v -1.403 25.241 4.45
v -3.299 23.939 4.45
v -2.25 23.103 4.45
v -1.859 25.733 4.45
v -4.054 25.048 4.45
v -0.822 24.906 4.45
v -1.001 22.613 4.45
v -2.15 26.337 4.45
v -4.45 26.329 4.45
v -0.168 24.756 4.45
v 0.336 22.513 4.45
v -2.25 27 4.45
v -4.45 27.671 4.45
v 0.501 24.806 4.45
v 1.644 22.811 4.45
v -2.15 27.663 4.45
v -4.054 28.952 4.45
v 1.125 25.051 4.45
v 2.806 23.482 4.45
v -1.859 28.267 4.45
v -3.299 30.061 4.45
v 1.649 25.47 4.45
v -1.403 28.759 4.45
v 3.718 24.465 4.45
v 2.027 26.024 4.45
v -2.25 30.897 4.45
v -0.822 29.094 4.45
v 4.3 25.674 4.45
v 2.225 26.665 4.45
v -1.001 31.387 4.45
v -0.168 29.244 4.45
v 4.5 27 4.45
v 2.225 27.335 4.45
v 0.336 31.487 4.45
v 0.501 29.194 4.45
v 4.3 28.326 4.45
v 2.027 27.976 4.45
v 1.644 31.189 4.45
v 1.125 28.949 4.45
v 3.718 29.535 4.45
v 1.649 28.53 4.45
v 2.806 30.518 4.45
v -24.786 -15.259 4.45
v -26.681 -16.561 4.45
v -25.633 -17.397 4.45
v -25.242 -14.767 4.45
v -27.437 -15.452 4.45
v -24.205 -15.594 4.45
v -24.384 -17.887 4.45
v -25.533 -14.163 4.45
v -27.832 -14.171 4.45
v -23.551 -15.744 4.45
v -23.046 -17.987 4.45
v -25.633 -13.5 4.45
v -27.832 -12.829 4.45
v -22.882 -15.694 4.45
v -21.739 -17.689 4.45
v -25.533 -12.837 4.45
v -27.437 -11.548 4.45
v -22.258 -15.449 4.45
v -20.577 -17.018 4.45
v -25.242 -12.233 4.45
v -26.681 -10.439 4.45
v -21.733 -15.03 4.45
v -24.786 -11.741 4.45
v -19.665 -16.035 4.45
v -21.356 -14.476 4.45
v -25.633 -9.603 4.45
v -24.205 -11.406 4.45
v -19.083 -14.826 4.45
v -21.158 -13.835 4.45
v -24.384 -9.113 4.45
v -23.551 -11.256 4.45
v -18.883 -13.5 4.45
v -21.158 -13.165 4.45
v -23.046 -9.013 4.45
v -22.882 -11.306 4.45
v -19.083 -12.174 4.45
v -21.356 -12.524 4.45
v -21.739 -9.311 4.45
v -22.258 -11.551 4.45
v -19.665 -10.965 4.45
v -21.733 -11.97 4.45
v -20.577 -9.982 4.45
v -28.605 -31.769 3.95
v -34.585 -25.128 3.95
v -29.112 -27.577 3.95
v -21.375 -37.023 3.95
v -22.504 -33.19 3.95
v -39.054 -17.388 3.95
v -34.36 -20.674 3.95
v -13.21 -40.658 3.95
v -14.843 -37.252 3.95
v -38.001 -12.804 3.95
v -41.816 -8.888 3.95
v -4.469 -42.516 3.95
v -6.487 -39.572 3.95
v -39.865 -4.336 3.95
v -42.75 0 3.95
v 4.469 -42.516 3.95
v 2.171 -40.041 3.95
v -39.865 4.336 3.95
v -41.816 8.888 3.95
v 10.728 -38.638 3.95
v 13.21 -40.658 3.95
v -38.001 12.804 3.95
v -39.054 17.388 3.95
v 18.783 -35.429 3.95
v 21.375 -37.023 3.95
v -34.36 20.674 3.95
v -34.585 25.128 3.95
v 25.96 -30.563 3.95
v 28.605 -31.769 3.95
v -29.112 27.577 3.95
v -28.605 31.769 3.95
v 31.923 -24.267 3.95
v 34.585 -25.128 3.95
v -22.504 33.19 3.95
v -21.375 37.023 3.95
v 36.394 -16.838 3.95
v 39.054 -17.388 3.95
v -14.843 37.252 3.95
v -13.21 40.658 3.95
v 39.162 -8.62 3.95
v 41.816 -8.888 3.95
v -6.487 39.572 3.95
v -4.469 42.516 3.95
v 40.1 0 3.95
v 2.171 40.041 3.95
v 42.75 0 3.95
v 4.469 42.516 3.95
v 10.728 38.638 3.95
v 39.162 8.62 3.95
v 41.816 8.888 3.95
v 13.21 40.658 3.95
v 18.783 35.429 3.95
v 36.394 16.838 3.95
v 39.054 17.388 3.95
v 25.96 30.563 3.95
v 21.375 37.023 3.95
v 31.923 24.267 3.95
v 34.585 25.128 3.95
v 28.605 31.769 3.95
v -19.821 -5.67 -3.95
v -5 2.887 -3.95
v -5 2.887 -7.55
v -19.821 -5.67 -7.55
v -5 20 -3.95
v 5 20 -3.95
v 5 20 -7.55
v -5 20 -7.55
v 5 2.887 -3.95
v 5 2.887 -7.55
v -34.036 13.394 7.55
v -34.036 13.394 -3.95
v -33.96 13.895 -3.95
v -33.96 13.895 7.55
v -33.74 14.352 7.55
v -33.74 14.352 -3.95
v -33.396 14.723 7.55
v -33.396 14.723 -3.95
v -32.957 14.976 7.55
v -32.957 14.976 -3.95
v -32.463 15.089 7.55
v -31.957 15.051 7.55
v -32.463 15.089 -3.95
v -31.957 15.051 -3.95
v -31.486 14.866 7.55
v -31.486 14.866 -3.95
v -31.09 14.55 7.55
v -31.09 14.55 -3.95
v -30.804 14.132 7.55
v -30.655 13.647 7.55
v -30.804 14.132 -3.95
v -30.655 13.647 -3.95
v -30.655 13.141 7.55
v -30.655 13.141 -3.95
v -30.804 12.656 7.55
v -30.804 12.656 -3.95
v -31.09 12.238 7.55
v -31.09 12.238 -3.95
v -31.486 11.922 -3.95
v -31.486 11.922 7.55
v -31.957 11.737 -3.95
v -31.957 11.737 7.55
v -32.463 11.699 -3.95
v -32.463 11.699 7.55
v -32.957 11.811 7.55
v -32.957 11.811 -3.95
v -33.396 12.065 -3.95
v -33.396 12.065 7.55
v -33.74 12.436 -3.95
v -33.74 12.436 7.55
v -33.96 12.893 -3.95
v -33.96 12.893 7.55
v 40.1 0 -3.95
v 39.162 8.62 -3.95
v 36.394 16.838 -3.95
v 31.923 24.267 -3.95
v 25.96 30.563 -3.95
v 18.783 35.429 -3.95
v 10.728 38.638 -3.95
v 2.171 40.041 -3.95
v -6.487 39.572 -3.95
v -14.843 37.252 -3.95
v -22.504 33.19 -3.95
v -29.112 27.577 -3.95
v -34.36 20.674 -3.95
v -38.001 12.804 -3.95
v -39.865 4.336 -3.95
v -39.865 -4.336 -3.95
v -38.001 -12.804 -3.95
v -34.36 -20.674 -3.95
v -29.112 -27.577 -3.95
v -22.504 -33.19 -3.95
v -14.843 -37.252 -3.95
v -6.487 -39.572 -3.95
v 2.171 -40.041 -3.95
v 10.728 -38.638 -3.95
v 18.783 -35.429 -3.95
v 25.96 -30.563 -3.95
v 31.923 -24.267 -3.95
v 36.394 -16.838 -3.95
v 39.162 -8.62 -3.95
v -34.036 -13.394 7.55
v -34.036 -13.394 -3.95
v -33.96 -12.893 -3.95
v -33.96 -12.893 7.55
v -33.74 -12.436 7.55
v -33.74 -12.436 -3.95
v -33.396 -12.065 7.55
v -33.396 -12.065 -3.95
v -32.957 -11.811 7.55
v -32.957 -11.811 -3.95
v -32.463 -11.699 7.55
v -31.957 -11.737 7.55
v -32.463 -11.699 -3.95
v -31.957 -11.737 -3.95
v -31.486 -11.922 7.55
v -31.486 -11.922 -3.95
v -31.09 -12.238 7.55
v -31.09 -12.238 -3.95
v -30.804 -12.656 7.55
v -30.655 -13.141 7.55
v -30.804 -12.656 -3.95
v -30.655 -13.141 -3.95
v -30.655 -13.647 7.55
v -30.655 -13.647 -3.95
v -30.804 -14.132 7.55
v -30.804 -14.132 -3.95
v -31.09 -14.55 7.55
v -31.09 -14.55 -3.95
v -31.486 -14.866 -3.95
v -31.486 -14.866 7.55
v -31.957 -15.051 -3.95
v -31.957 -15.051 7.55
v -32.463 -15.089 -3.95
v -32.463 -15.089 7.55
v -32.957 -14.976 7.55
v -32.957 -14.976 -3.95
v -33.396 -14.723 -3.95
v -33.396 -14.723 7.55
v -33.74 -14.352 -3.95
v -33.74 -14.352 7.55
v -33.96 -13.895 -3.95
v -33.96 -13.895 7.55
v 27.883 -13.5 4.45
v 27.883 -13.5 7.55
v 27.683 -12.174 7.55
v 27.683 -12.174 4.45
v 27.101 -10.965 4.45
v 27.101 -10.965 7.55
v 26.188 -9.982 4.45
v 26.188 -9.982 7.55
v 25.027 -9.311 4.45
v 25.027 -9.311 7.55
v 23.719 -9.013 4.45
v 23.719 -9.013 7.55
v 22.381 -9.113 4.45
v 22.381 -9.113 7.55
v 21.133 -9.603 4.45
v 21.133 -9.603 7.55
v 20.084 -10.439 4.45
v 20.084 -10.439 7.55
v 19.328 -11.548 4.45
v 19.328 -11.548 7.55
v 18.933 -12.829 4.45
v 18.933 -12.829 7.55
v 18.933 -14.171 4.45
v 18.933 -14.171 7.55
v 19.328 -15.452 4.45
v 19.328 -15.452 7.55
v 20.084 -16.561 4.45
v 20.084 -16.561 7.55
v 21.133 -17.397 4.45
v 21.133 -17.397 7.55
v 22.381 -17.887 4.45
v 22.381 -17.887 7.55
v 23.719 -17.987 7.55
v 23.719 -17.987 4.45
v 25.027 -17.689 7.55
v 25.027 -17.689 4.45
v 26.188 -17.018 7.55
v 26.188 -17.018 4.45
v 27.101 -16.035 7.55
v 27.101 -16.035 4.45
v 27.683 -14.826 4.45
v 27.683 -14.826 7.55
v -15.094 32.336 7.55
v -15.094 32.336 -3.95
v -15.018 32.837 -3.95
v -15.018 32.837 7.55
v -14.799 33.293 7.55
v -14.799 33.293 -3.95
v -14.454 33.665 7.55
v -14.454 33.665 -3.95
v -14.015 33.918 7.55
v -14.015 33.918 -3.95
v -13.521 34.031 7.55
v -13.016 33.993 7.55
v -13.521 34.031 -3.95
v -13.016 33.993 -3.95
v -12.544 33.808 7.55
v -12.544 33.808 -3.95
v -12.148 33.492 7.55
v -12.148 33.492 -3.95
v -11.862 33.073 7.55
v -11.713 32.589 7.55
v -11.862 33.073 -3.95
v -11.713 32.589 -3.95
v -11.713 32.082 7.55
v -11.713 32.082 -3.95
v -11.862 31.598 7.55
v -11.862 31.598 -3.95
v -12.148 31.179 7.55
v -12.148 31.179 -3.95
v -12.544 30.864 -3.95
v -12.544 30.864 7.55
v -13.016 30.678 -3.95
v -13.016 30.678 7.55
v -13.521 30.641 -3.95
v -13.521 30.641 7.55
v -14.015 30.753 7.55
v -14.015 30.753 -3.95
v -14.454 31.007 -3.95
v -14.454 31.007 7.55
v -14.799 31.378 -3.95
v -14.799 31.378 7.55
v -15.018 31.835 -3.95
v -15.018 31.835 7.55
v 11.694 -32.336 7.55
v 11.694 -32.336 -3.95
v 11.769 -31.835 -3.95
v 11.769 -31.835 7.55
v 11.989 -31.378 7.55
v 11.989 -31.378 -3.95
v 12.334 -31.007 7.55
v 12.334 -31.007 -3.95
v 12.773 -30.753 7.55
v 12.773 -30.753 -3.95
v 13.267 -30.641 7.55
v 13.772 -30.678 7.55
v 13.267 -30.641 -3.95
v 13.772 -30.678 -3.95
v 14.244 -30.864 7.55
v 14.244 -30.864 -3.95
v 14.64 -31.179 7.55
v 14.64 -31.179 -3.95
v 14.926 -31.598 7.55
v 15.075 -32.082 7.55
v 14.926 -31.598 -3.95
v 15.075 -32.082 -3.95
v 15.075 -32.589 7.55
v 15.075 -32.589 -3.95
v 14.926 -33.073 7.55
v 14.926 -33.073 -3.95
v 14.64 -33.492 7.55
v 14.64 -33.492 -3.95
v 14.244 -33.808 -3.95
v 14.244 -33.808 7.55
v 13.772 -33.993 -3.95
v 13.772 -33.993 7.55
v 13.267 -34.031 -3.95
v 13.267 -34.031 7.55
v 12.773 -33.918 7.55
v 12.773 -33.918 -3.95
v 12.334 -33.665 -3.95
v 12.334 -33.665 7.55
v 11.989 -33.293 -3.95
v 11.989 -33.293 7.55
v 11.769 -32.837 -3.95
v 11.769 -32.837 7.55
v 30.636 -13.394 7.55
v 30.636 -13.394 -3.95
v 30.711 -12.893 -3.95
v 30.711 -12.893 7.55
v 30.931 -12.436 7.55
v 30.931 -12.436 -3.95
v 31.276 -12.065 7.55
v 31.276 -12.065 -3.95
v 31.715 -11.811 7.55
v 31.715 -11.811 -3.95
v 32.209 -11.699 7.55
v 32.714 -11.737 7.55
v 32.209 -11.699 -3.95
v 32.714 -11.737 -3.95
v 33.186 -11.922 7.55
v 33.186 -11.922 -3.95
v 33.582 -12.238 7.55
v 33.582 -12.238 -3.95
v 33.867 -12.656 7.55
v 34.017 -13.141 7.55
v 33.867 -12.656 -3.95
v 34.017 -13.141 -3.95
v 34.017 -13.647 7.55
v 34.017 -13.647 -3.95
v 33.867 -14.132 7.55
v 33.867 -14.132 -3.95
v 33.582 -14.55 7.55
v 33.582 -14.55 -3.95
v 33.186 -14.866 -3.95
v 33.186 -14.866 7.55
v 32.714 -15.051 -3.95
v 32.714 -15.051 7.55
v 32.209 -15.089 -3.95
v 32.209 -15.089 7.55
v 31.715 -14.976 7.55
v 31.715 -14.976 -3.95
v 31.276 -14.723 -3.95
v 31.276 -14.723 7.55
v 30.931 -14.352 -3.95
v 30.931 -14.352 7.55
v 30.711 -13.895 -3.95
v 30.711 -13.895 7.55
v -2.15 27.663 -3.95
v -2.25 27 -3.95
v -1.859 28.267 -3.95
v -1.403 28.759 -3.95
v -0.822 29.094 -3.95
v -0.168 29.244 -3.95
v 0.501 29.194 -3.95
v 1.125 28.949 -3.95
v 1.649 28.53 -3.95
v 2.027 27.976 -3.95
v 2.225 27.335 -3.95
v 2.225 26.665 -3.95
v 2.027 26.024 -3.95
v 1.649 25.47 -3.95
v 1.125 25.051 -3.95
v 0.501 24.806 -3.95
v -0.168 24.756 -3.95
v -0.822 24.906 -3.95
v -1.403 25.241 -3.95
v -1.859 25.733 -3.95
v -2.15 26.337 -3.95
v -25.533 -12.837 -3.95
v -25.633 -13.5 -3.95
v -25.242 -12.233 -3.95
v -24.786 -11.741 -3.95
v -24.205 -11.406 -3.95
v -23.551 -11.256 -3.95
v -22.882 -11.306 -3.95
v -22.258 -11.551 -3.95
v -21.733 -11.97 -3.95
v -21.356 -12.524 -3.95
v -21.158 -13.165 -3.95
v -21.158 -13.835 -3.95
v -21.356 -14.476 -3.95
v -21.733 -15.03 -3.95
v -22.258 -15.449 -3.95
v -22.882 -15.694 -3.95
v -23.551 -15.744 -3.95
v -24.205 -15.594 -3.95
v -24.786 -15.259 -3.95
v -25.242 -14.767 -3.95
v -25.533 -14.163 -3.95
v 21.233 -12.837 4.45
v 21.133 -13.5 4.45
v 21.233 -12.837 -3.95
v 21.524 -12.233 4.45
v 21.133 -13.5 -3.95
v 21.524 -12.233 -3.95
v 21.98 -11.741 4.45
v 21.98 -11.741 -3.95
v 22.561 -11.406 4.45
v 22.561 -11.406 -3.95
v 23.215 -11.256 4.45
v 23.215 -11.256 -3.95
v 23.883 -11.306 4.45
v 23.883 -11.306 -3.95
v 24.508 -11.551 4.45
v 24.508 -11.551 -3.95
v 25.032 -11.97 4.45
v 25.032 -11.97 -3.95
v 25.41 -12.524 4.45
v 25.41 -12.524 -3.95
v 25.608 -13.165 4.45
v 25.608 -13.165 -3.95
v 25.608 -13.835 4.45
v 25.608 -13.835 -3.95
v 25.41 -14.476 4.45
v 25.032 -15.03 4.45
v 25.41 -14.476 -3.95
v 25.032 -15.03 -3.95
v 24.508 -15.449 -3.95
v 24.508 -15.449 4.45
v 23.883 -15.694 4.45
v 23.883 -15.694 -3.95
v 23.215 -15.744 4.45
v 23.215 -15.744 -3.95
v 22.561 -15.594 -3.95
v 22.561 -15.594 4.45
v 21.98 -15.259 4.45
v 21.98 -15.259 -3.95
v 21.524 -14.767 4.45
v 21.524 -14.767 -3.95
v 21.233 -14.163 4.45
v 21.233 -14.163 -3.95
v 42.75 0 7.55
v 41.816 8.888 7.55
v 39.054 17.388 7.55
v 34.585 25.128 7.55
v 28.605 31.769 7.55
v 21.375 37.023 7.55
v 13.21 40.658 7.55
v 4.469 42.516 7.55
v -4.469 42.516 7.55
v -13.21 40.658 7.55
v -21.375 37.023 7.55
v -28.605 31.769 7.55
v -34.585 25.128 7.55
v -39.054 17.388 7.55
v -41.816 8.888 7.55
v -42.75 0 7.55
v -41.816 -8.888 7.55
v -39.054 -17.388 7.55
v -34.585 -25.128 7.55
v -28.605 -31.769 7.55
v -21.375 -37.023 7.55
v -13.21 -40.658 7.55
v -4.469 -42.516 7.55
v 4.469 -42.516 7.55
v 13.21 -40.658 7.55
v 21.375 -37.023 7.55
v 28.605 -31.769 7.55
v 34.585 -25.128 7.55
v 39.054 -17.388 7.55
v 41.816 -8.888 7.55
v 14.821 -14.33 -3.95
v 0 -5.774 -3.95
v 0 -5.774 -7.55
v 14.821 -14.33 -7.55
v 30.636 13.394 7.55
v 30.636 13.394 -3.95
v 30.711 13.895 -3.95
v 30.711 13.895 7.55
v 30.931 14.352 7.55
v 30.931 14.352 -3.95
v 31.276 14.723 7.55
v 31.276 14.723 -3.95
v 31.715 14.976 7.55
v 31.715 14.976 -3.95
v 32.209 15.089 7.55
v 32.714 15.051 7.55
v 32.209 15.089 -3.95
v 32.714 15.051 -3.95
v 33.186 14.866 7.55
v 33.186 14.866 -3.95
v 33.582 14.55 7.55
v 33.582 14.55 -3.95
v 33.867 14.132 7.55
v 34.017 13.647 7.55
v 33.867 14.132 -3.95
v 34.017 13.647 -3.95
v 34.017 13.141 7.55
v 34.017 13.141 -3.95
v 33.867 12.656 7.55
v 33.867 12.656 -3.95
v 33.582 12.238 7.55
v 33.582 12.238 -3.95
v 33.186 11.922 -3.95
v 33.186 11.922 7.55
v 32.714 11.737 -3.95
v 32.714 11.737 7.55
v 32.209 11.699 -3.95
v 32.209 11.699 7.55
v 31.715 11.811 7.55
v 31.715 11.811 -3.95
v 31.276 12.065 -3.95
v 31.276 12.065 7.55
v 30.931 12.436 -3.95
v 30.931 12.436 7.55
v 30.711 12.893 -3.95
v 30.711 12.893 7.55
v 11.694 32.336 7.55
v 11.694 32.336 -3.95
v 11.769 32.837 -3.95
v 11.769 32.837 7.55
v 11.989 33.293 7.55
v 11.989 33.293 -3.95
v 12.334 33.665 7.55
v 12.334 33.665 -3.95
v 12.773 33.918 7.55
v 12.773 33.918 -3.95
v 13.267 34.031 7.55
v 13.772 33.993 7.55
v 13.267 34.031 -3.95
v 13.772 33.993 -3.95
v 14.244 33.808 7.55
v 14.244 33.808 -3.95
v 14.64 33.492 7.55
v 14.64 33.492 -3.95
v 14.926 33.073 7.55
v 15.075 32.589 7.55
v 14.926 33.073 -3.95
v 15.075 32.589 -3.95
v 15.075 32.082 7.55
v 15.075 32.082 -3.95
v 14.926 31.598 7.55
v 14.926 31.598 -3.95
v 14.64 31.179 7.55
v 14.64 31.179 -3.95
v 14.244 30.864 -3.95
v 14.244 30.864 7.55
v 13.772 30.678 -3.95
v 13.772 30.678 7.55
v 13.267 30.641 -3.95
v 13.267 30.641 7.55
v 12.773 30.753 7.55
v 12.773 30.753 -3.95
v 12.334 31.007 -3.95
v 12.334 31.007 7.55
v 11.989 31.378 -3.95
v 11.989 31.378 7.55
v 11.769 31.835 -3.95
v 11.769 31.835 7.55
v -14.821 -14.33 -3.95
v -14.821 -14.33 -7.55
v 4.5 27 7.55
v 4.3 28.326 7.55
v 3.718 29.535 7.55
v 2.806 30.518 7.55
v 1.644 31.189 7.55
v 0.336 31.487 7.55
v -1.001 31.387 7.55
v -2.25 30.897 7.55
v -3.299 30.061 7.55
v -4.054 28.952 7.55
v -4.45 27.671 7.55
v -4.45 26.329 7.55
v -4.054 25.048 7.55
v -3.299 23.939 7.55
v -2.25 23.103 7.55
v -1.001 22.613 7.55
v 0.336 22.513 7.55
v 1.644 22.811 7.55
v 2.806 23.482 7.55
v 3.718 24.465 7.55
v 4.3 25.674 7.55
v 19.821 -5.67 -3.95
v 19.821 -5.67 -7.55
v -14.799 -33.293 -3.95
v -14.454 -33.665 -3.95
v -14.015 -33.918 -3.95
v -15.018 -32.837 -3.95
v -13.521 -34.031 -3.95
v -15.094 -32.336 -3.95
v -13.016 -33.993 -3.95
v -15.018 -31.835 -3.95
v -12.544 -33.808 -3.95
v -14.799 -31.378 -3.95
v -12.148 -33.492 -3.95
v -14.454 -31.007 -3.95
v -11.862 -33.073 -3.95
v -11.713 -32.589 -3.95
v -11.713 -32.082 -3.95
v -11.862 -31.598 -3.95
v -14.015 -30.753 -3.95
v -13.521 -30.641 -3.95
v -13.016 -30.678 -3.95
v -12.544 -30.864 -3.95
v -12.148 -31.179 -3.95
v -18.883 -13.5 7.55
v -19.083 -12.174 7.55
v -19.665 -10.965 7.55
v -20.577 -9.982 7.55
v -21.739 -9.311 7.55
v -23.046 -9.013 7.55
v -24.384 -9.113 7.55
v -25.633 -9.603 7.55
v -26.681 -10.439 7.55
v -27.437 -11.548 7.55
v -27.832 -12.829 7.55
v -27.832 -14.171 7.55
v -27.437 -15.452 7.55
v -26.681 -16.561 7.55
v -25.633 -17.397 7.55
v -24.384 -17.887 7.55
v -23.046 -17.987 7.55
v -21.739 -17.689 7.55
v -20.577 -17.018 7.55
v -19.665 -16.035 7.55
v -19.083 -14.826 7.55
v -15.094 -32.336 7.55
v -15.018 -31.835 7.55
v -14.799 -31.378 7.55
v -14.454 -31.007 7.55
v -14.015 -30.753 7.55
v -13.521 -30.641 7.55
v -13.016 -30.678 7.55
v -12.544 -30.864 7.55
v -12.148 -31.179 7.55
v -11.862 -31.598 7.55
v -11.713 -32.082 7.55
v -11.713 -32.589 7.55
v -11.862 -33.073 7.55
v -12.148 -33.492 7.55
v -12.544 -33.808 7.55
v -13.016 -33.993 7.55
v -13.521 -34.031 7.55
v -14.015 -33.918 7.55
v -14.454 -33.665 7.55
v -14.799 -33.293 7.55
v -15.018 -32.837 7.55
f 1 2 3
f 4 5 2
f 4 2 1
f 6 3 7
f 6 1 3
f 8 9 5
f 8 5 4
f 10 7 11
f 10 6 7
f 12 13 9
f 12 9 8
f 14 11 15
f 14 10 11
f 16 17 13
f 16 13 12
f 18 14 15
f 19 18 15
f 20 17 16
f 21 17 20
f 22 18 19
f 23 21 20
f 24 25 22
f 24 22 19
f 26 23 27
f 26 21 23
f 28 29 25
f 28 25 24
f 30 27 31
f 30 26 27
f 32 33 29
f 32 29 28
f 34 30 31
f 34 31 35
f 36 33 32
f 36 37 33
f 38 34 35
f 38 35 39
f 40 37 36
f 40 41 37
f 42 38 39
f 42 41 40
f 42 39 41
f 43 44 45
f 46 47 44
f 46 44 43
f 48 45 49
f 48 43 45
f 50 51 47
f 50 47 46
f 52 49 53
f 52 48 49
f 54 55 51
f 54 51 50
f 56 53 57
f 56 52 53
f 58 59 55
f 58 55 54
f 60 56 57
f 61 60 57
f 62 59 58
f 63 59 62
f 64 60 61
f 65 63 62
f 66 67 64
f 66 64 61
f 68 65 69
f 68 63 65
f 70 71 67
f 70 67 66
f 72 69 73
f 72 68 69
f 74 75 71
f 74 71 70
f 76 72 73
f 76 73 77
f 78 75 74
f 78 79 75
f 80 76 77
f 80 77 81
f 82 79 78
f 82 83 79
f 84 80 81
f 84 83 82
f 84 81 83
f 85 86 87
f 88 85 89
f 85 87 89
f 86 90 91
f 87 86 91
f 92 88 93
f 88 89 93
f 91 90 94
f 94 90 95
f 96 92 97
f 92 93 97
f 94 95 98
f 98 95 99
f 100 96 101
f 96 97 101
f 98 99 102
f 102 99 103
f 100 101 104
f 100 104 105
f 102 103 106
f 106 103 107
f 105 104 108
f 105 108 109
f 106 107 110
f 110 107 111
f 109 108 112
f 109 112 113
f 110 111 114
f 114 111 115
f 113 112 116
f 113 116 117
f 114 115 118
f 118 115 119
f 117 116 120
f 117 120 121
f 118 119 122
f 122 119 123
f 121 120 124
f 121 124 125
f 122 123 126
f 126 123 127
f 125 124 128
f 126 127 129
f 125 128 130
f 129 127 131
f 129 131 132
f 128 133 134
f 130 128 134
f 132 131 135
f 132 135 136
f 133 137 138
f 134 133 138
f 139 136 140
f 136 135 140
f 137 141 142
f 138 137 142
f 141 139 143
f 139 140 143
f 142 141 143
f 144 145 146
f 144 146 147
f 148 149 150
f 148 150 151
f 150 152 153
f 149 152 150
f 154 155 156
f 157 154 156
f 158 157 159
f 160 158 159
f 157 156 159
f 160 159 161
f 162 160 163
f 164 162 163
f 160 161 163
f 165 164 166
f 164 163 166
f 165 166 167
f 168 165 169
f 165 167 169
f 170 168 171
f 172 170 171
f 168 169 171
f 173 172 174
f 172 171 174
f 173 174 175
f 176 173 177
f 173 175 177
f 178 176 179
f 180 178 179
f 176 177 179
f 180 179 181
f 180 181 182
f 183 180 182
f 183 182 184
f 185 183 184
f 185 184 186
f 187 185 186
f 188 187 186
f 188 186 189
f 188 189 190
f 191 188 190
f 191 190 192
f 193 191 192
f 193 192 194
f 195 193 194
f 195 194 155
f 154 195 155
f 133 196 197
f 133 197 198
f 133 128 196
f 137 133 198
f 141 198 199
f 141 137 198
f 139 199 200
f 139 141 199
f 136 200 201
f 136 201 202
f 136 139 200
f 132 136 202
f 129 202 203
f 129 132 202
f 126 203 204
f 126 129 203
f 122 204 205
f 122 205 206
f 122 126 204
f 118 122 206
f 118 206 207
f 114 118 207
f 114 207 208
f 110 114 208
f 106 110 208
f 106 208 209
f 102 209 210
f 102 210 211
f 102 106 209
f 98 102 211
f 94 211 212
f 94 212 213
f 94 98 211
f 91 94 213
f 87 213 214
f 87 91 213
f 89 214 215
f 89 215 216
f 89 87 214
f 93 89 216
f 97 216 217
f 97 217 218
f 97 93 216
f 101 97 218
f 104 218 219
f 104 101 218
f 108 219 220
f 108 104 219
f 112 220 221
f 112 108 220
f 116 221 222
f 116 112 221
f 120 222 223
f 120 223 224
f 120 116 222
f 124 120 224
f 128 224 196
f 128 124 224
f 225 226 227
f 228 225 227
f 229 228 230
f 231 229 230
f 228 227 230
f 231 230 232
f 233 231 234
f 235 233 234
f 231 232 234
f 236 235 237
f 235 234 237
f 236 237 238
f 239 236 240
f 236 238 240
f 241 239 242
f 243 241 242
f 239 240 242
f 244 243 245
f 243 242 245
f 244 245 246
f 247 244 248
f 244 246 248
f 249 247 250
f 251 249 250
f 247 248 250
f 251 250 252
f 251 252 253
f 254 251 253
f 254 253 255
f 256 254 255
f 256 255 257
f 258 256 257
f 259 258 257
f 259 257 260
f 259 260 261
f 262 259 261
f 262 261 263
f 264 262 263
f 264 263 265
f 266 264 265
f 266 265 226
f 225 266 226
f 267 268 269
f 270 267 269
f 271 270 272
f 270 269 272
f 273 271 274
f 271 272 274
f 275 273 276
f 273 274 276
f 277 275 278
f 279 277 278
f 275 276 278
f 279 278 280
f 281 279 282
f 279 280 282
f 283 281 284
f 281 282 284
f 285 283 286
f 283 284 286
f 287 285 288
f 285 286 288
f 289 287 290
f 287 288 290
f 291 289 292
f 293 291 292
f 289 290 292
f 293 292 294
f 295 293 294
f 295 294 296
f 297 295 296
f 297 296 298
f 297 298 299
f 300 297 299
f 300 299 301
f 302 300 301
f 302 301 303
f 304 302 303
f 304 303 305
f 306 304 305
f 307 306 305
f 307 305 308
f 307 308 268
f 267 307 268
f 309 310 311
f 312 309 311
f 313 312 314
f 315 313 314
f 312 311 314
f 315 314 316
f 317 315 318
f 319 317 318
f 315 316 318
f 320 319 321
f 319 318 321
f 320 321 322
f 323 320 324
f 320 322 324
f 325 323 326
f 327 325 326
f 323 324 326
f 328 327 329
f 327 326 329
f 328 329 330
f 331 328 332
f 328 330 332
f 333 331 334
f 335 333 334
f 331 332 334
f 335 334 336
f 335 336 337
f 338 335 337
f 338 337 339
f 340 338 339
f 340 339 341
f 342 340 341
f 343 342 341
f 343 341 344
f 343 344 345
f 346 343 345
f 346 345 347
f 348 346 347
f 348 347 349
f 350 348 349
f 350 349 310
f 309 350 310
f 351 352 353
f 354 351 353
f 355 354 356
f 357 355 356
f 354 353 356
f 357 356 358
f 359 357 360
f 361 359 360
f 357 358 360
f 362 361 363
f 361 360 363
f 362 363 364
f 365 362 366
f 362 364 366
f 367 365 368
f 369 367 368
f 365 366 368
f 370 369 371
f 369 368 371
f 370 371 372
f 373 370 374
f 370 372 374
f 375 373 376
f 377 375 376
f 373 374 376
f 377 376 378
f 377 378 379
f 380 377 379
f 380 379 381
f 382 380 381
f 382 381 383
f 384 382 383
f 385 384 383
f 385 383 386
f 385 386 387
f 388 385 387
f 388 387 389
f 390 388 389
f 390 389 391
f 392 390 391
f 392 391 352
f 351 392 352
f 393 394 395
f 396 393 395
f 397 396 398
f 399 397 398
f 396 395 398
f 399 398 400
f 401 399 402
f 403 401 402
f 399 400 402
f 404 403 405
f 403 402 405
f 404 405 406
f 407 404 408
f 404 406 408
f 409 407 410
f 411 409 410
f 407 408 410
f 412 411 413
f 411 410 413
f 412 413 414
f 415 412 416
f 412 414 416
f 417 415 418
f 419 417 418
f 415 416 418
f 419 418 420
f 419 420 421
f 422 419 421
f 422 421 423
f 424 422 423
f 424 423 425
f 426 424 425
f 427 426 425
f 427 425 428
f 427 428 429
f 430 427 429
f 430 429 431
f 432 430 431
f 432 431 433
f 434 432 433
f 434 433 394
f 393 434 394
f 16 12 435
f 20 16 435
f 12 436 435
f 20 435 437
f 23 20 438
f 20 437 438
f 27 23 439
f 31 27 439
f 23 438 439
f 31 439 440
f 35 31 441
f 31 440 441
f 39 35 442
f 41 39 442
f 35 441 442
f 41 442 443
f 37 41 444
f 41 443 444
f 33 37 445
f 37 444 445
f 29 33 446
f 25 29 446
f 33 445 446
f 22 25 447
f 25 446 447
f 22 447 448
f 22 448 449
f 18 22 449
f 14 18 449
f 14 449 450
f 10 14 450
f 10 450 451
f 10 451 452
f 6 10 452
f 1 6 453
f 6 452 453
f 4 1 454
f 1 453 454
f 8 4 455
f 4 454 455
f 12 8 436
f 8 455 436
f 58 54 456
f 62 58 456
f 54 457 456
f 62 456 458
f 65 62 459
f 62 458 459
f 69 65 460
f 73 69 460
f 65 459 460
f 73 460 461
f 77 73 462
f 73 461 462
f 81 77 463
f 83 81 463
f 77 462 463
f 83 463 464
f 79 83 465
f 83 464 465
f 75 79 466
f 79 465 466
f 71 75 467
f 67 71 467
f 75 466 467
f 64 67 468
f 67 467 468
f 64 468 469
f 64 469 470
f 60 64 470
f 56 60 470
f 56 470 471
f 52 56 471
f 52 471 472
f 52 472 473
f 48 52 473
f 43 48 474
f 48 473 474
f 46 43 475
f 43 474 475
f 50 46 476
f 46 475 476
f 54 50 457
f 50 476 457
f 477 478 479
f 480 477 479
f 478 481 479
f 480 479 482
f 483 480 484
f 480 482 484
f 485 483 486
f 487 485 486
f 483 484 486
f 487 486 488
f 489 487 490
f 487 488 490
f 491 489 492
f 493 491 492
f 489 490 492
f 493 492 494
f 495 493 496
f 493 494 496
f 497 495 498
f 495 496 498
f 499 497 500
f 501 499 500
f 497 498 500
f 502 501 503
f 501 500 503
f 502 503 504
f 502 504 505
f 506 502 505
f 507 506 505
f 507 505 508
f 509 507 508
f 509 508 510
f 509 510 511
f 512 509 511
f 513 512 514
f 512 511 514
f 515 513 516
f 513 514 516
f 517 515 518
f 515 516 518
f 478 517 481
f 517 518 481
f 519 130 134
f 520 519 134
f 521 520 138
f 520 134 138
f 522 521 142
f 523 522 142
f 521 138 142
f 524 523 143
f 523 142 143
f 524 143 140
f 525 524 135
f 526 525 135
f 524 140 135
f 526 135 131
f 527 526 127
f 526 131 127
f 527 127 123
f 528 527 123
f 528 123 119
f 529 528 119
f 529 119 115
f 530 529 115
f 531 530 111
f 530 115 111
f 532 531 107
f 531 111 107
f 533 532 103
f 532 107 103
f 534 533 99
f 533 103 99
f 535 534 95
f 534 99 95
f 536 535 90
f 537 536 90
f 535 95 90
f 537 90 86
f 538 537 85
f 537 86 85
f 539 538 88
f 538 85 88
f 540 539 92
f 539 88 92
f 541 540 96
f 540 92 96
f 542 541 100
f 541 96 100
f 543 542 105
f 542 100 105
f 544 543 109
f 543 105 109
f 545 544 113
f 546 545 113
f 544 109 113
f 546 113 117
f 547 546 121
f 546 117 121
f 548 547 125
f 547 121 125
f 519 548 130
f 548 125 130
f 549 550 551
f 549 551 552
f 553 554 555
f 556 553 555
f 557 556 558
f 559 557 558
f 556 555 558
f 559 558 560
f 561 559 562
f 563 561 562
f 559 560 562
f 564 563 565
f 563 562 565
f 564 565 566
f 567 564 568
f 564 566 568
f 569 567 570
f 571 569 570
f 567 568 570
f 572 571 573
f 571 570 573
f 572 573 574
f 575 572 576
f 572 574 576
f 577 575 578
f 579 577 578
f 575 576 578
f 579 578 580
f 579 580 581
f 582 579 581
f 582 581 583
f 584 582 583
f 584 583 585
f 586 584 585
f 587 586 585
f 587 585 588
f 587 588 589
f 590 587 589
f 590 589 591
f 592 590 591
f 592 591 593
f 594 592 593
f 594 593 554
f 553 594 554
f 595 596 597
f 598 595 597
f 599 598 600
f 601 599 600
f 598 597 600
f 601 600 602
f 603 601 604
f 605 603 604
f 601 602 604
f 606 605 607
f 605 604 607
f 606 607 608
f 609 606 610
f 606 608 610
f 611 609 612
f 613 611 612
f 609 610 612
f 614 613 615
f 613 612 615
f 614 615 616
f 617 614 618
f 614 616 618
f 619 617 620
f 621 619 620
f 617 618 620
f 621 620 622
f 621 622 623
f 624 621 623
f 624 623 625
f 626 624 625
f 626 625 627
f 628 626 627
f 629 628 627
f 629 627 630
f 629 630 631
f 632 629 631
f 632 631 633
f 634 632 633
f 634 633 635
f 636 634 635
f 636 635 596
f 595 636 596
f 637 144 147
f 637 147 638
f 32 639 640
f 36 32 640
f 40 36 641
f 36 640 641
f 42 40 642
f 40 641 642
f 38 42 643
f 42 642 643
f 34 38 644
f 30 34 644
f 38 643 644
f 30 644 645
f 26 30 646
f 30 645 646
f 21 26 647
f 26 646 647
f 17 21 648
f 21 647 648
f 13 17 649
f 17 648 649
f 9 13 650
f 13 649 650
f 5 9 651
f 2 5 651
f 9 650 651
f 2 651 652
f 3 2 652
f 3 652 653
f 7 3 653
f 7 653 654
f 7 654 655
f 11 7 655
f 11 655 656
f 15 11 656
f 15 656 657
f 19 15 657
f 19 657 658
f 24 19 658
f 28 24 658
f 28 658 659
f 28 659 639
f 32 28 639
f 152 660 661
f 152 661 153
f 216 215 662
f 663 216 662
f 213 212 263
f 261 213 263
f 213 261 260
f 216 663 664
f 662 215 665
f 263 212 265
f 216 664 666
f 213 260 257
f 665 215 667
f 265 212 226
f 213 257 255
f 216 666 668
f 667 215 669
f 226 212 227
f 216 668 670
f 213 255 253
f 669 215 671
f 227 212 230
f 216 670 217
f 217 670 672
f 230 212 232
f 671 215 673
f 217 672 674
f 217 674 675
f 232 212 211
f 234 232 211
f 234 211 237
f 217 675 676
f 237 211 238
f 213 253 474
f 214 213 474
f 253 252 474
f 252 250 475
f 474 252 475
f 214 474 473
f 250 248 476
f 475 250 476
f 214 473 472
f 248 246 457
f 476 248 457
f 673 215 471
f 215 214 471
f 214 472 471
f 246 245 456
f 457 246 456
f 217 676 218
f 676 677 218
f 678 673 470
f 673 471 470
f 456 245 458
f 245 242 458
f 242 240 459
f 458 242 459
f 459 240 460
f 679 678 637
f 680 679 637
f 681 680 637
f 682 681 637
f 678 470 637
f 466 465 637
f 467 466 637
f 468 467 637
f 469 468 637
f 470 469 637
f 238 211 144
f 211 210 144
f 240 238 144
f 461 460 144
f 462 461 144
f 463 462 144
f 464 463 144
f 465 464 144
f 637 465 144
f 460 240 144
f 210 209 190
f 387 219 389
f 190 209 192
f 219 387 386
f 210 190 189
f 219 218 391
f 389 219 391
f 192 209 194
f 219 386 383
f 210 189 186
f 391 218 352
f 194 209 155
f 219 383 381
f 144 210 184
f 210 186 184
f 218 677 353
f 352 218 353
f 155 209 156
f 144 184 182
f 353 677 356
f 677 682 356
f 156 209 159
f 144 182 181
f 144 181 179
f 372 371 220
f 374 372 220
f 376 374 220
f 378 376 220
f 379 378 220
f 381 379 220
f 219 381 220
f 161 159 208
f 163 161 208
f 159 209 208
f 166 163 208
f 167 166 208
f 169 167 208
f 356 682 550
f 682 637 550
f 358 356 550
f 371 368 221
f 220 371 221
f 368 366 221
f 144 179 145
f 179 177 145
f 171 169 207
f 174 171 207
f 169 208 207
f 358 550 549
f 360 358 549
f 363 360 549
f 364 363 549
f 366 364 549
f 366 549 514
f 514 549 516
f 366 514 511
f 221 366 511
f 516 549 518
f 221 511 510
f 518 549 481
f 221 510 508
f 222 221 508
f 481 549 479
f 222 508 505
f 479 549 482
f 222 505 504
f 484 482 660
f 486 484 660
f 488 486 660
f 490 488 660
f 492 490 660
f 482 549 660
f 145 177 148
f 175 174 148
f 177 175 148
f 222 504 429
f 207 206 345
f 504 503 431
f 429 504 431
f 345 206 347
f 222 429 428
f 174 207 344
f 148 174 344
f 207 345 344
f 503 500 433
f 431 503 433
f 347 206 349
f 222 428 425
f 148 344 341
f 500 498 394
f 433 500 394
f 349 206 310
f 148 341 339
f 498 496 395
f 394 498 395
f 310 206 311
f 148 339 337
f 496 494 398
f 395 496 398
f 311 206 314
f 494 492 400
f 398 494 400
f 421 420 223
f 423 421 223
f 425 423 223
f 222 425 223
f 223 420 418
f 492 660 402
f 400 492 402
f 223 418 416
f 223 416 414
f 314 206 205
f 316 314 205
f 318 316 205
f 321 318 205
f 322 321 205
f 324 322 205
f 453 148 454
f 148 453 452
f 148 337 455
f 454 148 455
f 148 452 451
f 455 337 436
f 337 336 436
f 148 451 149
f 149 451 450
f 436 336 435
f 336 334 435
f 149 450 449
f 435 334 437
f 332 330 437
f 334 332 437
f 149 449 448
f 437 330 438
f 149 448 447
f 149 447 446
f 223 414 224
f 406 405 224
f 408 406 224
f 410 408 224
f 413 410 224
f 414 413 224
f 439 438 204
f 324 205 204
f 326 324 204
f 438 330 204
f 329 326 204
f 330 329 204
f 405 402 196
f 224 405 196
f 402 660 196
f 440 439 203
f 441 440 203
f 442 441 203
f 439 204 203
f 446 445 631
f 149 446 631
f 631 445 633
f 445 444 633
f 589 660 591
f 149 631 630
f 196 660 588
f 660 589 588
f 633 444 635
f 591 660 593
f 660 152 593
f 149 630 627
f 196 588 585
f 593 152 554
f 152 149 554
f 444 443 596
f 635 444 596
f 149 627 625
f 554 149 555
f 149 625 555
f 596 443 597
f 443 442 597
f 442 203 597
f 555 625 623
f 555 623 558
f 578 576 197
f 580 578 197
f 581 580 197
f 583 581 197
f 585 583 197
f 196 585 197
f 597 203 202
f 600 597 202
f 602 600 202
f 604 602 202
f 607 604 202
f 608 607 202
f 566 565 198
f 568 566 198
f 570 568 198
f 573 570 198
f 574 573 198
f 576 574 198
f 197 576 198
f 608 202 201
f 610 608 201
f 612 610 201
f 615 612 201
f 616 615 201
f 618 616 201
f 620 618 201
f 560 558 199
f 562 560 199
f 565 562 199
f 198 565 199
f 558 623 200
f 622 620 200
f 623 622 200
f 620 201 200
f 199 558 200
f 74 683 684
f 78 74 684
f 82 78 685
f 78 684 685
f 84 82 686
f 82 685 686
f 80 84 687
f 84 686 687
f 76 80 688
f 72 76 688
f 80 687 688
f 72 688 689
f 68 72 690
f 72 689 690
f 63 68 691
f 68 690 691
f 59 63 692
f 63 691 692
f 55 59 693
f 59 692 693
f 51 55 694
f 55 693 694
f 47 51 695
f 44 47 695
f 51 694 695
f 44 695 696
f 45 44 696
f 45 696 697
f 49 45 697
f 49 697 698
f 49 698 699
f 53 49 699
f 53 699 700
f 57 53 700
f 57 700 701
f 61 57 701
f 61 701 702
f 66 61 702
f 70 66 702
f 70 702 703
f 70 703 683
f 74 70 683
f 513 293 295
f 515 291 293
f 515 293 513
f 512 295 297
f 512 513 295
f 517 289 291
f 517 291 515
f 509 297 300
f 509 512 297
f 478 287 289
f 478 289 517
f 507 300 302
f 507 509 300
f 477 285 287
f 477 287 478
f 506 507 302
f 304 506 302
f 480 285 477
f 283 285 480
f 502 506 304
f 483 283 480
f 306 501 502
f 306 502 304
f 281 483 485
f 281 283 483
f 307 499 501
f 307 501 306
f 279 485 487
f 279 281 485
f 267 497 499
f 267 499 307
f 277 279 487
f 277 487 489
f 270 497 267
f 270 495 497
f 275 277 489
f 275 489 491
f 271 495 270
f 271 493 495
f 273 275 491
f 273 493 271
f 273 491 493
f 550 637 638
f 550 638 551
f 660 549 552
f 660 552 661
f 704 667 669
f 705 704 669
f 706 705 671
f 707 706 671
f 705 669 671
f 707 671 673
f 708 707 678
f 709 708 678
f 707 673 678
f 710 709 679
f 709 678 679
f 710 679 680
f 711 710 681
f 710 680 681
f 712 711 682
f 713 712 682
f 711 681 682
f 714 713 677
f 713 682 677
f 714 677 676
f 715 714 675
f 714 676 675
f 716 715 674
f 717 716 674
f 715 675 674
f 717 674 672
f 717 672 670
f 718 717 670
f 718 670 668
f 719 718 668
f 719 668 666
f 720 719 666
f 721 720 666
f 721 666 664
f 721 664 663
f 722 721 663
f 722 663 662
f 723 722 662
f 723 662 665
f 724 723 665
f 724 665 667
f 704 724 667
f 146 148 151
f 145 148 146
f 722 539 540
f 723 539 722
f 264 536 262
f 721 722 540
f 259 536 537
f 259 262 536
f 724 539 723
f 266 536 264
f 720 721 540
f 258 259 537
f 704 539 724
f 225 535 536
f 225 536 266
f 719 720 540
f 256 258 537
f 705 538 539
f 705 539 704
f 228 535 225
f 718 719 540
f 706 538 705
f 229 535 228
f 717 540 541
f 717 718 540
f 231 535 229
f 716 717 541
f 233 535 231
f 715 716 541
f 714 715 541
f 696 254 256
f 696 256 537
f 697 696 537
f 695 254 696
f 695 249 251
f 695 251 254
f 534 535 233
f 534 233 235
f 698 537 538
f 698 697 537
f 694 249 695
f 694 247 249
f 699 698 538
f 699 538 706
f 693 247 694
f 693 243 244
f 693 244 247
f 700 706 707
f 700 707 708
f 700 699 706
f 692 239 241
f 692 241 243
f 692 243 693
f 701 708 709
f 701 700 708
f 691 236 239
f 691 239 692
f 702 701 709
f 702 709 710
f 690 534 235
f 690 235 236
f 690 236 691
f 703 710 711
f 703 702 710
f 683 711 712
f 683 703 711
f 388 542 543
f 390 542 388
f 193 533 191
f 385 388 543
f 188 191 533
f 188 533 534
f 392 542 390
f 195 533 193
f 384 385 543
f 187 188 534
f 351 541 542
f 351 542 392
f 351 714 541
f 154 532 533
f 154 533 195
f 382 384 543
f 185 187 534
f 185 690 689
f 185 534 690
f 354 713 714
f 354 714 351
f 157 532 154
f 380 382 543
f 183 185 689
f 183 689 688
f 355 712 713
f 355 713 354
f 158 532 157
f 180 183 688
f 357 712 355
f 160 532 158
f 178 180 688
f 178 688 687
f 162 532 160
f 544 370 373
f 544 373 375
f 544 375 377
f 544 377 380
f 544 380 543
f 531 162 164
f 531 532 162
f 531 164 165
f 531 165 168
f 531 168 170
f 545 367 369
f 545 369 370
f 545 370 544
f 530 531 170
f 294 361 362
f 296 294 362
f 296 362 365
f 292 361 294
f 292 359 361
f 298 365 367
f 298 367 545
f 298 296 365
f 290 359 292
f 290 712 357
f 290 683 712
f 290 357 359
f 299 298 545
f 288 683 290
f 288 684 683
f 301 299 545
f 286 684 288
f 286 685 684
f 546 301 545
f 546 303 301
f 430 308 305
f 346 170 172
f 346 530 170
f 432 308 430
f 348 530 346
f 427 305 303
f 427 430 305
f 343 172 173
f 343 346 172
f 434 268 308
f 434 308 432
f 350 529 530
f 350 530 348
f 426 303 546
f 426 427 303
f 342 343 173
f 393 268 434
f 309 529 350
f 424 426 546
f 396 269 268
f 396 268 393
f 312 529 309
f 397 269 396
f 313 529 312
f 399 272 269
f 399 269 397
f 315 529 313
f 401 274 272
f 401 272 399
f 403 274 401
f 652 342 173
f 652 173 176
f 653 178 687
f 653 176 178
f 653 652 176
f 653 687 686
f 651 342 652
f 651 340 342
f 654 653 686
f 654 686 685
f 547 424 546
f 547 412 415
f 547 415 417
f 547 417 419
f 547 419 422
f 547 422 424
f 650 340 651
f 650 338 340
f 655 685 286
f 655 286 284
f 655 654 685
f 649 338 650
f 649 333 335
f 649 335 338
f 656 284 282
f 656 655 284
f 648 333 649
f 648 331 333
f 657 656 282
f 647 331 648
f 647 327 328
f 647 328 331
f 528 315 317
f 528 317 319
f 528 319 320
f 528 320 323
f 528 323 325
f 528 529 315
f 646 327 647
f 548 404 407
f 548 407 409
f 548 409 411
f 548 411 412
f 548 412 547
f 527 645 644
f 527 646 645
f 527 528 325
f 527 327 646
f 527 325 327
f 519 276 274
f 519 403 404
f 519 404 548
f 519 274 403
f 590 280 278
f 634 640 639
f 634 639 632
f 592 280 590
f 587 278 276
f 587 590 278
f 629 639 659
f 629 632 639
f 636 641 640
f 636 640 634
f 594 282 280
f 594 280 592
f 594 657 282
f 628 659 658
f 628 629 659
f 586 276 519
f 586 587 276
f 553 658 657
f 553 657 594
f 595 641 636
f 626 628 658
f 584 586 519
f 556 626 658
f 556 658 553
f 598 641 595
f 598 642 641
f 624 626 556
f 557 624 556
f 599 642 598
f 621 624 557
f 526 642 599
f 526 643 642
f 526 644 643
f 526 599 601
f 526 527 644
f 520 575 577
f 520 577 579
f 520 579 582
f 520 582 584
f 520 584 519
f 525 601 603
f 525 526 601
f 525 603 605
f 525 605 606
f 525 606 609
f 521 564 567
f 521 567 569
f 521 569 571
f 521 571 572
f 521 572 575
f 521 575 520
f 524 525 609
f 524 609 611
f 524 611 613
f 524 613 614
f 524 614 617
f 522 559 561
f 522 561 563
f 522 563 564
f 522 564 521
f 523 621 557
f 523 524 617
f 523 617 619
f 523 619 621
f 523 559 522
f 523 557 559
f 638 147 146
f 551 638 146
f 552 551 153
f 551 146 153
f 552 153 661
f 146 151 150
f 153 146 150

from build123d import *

# Parameters (mm, degrees)
CROQUIS1_R                                           = 40.1
SALIENTE_EXTRUIR1_DEPTH                              = 3.95
CROQUIS2_R                                           = 42.75
SALIENTE_EXTRUIR2_DEPTH                              = 3.6
REFRENTADO_PARA_TORNILLO_CON_CABEZA_TRON_D           = 4.5
REFRENTADO_PARA_TORNILLO_CON_CABEZA_TRON_CBORE_D     = 9
REFRENTADO_PARA_TORNILLO_CON_CABEZA_TRON_CBORE_DEPTH = 3.1
SALIENTE_EXTRUIR3_DEPTH                              = 3.6
TALADRO_DE_MARGEN_PARA_M32_D                         = 3.4


with BuildPart() as part:
    # Croquis1 → Saliente-Extruir1 (new, symmetric)
    with BuildSketch(Plane.XY):
        Circle(CROQUIS1_R)
    extrude(amount=SALIENTE_EXTRUIR1_DEPTH, both=True)

    # Croquis2 → Saliente-Extruir2 (add)
    with BuildSketch(Plane.XY.offset(3.95)):
        Circle(CROQUIS2_R)
    extrude(amount=SALIENTE_EXTRUIR2_DEPTH)

    # Refrentado para tornillo con cabeza troncocónica de M41 (through all)
    with Locations(Plane.XY.offset(7.55)):
        with Locations((0, 27), (23.382685902, -13.5), (-23.382685902, -13.5)):
            CounterBoreHole(REFRENTADO_PARA_TORNILLO_CON_CABEZA_TRON_D / 2, REFRENTADO_PARA_TORNILLO_CON_CABEZA_TRON_CBORE_D / 2, REFRENTADO_PARA_TORNILLO_CON_CABEZA_TRON_CBORE_DEPTH)

    # Croquis6 → Saliente-Extruir3 (add)
    with BuildSketch(Plane(origin=(0, 0, -3.95), x_dir=(-1, 0, 0), z_dir=(0, 0, -1))):
        Polygon((5, 20), (5, 2.886751346), (19.820508076, -5.669872981), (14.820508076, -14.330127019), (0, -5.773502692), (-14.820508076, -14.330127019), (-19.820508076, -5.669872981), (-5, 2.886751346), (-5, 20), align=None)
    extrude(amount=SALIENTE_EXTRUIR3_DEPTH)

    # Taladro de margen para M32 (through all)
    with Locations(Plane.XY.offset(7.55)):
        with Locations((13.393920133, 32.335783638), (32.335783638, 13.393920133), (32.335783638, -13.393920133), (13.393920133, -32.335783638), (-13.393920133, -32.335783638), (-32.335783638, -13.393920133), (-32.335783638, 13.393920133), (-13.393920133, 32.335783638)):
            Hole(TALADRO_DE_MARGEN_PARA_M32_D / 2)


solid = part.part
